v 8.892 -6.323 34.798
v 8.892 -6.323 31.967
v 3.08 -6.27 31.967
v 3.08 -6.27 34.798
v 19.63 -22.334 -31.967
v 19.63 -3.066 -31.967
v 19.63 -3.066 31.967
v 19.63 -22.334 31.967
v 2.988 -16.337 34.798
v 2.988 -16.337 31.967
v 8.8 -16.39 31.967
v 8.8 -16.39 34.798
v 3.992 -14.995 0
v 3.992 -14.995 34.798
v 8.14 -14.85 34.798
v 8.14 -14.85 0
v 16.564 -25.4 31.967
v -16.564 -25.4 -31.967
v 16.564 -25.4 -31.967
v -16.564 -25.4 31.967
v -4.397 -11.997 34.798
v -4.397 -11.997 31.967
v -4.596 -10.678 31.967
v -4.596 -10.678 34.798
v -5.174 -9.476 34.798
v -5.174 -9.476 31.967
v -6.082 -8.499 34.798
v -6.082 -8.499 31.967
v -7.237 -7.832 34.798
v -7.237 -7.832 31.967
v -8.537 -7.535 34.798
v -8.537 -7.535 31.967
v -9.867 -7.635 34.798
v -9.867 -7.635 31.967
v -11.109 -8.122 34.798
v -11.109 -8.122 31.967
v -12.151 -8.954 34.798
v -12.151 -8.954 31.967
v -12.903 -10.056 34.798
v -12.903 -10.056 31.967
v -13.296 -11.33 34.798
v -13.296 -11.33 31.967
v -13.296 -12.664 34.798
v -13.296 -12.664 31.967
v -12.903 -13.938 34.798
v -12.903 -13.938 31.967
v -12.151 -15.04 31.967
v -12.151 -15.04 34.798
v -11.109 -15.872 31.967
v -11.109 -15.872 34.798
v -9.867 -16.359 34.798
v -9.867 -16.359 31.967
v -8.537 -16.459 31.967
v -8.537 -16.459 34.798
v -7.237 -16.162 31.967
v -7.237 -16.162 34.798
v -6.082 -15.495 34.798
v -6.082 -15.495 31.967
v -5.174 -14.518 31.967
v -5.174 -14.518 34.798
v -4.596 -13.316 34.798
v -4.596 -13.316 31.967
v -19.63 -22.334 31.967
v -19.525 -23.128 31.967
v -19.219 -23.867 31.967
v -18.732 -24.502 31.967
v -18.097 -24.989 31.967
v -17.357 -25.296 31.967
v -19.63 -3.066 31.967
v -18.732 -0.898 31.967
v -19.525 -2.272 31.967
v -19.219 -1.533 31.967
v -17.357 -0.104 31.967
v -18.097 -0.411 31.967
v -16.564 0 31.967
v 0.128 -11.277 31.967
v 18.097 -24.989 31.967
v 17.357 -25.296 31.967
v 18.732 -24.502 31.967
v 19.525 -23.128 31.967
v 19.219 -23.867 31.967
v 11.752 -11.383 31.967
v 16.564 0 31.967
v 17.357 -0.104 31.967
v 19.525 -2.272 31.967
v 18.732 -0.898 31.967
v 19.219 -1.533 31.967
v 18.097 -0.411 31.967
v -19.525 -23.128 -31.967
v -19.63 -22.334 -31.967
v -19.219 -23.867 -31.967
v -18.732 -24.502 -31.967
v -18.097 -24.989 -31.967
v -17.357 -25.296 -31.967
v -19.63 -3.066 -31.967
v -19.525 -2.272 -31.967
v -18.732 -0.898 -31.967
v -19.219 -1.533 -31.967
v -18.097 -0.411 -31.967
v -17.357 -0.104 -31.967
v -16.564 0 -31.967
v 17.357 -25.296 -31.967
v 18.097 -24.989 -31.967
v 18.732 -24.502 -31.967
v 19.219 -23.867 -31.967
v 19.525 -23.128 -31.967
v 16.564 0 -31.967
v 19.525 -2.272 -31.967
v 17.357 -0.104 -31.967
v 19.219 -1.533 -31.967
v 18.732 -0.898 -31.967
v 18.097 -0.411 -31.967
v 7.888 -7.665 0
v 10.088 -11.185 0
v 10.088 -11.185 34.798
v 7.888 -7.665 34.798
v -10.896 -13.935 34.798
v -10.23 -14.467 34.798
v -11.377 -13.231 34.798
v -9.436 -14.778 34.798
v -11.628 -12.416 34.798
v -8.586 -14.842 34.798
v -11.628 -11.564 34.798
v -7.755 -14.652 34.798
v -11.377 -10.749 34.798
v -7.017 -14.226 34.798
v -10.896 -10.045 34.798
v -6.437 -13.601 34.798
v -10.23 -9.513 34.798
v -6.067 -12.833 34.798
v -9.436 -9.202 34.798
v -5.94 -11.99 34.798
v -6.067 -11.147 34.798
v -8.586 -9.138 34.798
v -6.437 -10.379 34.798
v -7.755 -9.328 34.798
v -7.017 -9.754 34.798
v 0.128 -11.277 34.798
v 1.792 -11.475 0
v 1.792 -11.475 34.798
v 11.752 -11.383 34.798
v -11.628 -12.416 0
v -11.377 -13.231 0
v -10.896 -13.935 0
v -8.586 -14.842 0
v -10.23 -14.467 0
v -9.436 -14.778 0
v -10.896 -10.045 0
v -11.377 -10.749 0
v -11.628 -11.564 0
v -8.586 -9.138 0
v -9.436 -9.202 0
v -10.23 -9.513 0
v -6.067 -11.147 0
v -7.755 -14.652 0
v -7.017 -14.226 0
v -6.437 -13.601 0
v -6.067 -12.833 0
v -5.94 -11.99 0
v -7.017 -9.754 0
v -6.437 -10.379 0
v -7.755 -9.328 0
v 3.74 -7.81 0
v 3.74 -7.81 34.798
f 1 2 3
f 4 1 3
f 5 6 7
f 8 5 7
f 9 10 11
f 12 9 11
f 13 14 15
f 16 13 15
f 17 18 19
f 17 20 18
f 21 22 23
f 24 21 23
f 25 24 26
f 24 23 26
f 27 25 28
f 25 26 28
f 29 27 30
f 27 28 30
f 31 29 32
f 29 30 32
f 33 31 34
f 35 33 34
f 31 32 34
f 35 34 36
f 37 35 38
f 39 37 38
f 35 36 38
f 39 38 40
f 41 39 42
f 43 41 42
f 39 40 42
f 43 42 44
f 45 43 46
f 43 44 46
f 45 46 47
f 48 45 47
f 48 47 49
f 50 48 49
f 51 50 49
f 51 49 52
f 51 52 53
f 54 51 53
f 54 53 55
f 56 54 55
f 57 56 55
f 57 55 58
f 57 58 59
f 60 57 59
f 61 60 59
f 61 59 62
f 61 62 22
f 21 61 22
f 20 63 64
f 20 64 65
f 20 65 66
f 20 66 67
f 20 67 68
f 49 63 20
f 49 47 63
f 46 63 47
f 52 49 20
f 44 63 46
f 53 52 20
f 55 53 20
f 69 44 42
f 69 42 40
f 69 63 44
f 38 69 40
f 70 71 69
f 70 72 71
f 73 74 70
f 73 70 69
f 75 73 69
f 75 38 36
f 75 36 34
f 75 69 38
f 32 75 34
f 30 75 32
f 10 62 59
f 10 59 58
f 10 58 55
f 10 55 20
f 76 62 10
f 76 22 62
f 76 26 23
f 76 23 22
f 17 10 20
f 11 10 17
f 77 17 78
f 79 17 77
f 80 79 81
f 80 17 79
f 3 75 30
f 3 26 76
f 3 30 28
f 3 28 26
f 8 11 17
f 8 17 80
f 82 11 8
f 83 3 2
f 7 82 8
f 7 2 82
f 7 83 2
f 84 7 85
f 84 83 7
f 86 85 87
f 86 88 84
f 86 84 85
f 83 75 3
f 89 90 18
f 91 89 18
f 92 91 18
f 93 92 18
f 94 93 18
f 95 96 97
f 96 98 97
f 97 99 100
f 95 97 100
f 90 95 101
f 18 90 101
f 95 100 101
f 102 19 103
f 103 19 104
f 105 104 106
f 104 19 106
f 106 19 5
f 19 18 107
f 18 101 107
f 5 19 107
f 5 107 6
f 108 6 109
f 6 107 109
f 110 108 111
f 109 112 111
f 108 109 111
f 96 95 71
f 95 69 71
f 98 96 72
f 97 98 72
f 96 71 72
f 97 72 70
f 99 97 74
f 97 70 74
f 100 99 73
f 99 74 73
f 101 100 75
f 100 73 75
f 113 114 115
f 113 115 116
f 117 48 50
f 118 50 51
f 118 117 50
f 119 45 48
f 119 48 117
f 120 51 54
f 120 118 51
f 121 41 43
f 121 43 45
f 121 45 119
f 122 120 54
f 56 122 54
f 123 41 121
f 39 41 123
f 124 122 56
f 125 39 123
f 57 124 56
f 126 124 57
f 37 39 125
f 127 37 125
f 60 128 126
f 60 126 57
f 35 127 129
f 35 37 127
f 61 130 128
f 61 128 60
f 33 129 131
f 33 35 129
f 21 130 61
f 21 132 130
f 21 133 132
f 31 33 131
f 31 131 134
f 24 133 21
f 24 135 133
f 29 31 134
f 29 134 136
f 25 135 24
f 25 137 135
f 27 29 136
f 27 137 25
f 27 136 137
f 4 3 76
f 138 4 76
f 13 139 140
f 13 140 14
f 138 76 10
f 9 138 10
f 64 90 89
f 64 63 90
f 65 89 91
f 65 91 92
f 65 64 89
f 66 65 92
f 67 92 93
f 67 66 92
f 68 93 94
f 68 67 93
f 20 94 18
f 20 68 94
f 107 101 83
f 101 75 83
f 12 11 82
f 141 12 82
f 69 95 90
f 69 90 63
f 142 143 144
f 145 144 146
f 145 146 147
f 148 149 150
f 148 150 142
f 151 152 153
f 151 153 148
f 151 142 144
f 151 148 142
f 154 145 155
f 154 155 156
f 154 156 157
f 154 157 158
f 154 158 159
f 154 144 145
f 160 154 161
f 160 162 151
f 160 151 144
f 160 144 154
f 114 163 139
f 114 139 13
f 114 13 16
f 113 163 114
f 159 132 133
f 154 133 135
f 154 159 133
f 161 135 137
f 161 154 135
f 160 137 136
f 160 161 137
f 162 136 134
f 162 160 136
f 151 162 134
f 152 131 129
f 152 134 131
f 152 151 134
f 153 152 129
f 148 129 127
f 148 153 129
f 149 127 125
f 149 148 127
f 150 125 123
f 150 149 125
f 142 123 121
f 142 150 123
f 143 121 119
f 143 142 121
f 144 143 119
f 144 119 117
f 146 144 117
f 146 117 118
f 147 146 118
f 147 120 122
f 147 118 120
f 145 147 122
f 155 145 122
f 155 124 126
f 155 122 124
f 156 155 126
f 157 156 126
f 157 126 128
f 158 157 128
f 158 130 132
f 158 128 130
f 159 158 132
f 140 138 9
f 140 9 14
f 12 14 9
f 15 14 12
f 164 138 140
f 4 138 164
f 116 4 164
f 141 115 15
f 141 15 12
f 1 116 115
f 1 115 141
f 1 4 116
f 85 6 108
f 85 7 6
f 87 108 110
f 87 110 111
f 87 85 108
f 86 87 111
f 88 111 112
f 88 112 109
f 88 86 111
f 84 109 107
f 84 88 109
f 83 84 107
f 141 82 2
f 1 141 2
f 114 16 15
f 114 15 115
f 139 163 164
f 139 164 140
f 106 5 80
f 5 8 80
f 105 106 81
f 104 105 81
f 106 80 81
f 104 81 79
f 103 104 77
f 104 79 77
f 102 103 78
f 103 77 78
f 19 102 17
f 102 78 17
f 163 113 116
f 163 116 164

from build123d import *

# Parameters (mm, degrees)
F0_W     = 39.259444
F0_H     = 63.933932
F1_DEPTH = 25.4
F2_R     = 3.066051
F3_R     = 4.474413
F4_DEPTH = 34.798
F6_DEPTH = 34.798
F7_R     = 2.859954
F8_DEPTH = 35.306


with BuildPart() as f1:
    # F0 (on Front) → F1 (new body)
    with BuildSketch(Plane.XZ):
        Rectangle(F0_W, F0_H)
    extrude(amount=F1_DEPTH)

    # F2
    f2_edges = [f1.edges().sort_by_distance(p)[0] for p in [
        (-19.629722, -25.4, 0),
        (19.629722, 0, 0),
        (19.629722, -25.4, 0),
        (-19.629722, 0, 0),
    ]]
    fillet(f2_edges, radius=F2_R)

    # F3 (on Top) → F4 (join)
    with BuildSketch(Plane.XY):
        with Locations((-8.871355, -11.997017)):
            Circle(F3_R)
    extrude(amount=F4_DEPTH)

    # F5 (on Top) → F6 (join)
    with BuildSketch(Plane.XY):
        Polygon((2.987864, -16.336561), (8.799858, -16.389728), (11.751899, -11.382976), (8.891946, -6.323057), (3.079951, -6.269891), (0.12791, -11.276643), align=None)
    extrude(amount=F6_DEPTH)

    # F7 (on Top) → F8 (cut)
    with BuildSketch(Plane.XY):
        with Locations((-8.799859, -11.989804)):
            Circle(F7_R)
        Polygon((7.888282, -7.664617), (3.739939, -7.809872), (1.791562, -11.475069), (3.991527, -14.995012), (8.13987, -14.849758), (10.088247, -11.18456), align=None)
    extrude(amount=F8_DEPTH, mode=Mode.SUBTRACT)


solid = f1.part
